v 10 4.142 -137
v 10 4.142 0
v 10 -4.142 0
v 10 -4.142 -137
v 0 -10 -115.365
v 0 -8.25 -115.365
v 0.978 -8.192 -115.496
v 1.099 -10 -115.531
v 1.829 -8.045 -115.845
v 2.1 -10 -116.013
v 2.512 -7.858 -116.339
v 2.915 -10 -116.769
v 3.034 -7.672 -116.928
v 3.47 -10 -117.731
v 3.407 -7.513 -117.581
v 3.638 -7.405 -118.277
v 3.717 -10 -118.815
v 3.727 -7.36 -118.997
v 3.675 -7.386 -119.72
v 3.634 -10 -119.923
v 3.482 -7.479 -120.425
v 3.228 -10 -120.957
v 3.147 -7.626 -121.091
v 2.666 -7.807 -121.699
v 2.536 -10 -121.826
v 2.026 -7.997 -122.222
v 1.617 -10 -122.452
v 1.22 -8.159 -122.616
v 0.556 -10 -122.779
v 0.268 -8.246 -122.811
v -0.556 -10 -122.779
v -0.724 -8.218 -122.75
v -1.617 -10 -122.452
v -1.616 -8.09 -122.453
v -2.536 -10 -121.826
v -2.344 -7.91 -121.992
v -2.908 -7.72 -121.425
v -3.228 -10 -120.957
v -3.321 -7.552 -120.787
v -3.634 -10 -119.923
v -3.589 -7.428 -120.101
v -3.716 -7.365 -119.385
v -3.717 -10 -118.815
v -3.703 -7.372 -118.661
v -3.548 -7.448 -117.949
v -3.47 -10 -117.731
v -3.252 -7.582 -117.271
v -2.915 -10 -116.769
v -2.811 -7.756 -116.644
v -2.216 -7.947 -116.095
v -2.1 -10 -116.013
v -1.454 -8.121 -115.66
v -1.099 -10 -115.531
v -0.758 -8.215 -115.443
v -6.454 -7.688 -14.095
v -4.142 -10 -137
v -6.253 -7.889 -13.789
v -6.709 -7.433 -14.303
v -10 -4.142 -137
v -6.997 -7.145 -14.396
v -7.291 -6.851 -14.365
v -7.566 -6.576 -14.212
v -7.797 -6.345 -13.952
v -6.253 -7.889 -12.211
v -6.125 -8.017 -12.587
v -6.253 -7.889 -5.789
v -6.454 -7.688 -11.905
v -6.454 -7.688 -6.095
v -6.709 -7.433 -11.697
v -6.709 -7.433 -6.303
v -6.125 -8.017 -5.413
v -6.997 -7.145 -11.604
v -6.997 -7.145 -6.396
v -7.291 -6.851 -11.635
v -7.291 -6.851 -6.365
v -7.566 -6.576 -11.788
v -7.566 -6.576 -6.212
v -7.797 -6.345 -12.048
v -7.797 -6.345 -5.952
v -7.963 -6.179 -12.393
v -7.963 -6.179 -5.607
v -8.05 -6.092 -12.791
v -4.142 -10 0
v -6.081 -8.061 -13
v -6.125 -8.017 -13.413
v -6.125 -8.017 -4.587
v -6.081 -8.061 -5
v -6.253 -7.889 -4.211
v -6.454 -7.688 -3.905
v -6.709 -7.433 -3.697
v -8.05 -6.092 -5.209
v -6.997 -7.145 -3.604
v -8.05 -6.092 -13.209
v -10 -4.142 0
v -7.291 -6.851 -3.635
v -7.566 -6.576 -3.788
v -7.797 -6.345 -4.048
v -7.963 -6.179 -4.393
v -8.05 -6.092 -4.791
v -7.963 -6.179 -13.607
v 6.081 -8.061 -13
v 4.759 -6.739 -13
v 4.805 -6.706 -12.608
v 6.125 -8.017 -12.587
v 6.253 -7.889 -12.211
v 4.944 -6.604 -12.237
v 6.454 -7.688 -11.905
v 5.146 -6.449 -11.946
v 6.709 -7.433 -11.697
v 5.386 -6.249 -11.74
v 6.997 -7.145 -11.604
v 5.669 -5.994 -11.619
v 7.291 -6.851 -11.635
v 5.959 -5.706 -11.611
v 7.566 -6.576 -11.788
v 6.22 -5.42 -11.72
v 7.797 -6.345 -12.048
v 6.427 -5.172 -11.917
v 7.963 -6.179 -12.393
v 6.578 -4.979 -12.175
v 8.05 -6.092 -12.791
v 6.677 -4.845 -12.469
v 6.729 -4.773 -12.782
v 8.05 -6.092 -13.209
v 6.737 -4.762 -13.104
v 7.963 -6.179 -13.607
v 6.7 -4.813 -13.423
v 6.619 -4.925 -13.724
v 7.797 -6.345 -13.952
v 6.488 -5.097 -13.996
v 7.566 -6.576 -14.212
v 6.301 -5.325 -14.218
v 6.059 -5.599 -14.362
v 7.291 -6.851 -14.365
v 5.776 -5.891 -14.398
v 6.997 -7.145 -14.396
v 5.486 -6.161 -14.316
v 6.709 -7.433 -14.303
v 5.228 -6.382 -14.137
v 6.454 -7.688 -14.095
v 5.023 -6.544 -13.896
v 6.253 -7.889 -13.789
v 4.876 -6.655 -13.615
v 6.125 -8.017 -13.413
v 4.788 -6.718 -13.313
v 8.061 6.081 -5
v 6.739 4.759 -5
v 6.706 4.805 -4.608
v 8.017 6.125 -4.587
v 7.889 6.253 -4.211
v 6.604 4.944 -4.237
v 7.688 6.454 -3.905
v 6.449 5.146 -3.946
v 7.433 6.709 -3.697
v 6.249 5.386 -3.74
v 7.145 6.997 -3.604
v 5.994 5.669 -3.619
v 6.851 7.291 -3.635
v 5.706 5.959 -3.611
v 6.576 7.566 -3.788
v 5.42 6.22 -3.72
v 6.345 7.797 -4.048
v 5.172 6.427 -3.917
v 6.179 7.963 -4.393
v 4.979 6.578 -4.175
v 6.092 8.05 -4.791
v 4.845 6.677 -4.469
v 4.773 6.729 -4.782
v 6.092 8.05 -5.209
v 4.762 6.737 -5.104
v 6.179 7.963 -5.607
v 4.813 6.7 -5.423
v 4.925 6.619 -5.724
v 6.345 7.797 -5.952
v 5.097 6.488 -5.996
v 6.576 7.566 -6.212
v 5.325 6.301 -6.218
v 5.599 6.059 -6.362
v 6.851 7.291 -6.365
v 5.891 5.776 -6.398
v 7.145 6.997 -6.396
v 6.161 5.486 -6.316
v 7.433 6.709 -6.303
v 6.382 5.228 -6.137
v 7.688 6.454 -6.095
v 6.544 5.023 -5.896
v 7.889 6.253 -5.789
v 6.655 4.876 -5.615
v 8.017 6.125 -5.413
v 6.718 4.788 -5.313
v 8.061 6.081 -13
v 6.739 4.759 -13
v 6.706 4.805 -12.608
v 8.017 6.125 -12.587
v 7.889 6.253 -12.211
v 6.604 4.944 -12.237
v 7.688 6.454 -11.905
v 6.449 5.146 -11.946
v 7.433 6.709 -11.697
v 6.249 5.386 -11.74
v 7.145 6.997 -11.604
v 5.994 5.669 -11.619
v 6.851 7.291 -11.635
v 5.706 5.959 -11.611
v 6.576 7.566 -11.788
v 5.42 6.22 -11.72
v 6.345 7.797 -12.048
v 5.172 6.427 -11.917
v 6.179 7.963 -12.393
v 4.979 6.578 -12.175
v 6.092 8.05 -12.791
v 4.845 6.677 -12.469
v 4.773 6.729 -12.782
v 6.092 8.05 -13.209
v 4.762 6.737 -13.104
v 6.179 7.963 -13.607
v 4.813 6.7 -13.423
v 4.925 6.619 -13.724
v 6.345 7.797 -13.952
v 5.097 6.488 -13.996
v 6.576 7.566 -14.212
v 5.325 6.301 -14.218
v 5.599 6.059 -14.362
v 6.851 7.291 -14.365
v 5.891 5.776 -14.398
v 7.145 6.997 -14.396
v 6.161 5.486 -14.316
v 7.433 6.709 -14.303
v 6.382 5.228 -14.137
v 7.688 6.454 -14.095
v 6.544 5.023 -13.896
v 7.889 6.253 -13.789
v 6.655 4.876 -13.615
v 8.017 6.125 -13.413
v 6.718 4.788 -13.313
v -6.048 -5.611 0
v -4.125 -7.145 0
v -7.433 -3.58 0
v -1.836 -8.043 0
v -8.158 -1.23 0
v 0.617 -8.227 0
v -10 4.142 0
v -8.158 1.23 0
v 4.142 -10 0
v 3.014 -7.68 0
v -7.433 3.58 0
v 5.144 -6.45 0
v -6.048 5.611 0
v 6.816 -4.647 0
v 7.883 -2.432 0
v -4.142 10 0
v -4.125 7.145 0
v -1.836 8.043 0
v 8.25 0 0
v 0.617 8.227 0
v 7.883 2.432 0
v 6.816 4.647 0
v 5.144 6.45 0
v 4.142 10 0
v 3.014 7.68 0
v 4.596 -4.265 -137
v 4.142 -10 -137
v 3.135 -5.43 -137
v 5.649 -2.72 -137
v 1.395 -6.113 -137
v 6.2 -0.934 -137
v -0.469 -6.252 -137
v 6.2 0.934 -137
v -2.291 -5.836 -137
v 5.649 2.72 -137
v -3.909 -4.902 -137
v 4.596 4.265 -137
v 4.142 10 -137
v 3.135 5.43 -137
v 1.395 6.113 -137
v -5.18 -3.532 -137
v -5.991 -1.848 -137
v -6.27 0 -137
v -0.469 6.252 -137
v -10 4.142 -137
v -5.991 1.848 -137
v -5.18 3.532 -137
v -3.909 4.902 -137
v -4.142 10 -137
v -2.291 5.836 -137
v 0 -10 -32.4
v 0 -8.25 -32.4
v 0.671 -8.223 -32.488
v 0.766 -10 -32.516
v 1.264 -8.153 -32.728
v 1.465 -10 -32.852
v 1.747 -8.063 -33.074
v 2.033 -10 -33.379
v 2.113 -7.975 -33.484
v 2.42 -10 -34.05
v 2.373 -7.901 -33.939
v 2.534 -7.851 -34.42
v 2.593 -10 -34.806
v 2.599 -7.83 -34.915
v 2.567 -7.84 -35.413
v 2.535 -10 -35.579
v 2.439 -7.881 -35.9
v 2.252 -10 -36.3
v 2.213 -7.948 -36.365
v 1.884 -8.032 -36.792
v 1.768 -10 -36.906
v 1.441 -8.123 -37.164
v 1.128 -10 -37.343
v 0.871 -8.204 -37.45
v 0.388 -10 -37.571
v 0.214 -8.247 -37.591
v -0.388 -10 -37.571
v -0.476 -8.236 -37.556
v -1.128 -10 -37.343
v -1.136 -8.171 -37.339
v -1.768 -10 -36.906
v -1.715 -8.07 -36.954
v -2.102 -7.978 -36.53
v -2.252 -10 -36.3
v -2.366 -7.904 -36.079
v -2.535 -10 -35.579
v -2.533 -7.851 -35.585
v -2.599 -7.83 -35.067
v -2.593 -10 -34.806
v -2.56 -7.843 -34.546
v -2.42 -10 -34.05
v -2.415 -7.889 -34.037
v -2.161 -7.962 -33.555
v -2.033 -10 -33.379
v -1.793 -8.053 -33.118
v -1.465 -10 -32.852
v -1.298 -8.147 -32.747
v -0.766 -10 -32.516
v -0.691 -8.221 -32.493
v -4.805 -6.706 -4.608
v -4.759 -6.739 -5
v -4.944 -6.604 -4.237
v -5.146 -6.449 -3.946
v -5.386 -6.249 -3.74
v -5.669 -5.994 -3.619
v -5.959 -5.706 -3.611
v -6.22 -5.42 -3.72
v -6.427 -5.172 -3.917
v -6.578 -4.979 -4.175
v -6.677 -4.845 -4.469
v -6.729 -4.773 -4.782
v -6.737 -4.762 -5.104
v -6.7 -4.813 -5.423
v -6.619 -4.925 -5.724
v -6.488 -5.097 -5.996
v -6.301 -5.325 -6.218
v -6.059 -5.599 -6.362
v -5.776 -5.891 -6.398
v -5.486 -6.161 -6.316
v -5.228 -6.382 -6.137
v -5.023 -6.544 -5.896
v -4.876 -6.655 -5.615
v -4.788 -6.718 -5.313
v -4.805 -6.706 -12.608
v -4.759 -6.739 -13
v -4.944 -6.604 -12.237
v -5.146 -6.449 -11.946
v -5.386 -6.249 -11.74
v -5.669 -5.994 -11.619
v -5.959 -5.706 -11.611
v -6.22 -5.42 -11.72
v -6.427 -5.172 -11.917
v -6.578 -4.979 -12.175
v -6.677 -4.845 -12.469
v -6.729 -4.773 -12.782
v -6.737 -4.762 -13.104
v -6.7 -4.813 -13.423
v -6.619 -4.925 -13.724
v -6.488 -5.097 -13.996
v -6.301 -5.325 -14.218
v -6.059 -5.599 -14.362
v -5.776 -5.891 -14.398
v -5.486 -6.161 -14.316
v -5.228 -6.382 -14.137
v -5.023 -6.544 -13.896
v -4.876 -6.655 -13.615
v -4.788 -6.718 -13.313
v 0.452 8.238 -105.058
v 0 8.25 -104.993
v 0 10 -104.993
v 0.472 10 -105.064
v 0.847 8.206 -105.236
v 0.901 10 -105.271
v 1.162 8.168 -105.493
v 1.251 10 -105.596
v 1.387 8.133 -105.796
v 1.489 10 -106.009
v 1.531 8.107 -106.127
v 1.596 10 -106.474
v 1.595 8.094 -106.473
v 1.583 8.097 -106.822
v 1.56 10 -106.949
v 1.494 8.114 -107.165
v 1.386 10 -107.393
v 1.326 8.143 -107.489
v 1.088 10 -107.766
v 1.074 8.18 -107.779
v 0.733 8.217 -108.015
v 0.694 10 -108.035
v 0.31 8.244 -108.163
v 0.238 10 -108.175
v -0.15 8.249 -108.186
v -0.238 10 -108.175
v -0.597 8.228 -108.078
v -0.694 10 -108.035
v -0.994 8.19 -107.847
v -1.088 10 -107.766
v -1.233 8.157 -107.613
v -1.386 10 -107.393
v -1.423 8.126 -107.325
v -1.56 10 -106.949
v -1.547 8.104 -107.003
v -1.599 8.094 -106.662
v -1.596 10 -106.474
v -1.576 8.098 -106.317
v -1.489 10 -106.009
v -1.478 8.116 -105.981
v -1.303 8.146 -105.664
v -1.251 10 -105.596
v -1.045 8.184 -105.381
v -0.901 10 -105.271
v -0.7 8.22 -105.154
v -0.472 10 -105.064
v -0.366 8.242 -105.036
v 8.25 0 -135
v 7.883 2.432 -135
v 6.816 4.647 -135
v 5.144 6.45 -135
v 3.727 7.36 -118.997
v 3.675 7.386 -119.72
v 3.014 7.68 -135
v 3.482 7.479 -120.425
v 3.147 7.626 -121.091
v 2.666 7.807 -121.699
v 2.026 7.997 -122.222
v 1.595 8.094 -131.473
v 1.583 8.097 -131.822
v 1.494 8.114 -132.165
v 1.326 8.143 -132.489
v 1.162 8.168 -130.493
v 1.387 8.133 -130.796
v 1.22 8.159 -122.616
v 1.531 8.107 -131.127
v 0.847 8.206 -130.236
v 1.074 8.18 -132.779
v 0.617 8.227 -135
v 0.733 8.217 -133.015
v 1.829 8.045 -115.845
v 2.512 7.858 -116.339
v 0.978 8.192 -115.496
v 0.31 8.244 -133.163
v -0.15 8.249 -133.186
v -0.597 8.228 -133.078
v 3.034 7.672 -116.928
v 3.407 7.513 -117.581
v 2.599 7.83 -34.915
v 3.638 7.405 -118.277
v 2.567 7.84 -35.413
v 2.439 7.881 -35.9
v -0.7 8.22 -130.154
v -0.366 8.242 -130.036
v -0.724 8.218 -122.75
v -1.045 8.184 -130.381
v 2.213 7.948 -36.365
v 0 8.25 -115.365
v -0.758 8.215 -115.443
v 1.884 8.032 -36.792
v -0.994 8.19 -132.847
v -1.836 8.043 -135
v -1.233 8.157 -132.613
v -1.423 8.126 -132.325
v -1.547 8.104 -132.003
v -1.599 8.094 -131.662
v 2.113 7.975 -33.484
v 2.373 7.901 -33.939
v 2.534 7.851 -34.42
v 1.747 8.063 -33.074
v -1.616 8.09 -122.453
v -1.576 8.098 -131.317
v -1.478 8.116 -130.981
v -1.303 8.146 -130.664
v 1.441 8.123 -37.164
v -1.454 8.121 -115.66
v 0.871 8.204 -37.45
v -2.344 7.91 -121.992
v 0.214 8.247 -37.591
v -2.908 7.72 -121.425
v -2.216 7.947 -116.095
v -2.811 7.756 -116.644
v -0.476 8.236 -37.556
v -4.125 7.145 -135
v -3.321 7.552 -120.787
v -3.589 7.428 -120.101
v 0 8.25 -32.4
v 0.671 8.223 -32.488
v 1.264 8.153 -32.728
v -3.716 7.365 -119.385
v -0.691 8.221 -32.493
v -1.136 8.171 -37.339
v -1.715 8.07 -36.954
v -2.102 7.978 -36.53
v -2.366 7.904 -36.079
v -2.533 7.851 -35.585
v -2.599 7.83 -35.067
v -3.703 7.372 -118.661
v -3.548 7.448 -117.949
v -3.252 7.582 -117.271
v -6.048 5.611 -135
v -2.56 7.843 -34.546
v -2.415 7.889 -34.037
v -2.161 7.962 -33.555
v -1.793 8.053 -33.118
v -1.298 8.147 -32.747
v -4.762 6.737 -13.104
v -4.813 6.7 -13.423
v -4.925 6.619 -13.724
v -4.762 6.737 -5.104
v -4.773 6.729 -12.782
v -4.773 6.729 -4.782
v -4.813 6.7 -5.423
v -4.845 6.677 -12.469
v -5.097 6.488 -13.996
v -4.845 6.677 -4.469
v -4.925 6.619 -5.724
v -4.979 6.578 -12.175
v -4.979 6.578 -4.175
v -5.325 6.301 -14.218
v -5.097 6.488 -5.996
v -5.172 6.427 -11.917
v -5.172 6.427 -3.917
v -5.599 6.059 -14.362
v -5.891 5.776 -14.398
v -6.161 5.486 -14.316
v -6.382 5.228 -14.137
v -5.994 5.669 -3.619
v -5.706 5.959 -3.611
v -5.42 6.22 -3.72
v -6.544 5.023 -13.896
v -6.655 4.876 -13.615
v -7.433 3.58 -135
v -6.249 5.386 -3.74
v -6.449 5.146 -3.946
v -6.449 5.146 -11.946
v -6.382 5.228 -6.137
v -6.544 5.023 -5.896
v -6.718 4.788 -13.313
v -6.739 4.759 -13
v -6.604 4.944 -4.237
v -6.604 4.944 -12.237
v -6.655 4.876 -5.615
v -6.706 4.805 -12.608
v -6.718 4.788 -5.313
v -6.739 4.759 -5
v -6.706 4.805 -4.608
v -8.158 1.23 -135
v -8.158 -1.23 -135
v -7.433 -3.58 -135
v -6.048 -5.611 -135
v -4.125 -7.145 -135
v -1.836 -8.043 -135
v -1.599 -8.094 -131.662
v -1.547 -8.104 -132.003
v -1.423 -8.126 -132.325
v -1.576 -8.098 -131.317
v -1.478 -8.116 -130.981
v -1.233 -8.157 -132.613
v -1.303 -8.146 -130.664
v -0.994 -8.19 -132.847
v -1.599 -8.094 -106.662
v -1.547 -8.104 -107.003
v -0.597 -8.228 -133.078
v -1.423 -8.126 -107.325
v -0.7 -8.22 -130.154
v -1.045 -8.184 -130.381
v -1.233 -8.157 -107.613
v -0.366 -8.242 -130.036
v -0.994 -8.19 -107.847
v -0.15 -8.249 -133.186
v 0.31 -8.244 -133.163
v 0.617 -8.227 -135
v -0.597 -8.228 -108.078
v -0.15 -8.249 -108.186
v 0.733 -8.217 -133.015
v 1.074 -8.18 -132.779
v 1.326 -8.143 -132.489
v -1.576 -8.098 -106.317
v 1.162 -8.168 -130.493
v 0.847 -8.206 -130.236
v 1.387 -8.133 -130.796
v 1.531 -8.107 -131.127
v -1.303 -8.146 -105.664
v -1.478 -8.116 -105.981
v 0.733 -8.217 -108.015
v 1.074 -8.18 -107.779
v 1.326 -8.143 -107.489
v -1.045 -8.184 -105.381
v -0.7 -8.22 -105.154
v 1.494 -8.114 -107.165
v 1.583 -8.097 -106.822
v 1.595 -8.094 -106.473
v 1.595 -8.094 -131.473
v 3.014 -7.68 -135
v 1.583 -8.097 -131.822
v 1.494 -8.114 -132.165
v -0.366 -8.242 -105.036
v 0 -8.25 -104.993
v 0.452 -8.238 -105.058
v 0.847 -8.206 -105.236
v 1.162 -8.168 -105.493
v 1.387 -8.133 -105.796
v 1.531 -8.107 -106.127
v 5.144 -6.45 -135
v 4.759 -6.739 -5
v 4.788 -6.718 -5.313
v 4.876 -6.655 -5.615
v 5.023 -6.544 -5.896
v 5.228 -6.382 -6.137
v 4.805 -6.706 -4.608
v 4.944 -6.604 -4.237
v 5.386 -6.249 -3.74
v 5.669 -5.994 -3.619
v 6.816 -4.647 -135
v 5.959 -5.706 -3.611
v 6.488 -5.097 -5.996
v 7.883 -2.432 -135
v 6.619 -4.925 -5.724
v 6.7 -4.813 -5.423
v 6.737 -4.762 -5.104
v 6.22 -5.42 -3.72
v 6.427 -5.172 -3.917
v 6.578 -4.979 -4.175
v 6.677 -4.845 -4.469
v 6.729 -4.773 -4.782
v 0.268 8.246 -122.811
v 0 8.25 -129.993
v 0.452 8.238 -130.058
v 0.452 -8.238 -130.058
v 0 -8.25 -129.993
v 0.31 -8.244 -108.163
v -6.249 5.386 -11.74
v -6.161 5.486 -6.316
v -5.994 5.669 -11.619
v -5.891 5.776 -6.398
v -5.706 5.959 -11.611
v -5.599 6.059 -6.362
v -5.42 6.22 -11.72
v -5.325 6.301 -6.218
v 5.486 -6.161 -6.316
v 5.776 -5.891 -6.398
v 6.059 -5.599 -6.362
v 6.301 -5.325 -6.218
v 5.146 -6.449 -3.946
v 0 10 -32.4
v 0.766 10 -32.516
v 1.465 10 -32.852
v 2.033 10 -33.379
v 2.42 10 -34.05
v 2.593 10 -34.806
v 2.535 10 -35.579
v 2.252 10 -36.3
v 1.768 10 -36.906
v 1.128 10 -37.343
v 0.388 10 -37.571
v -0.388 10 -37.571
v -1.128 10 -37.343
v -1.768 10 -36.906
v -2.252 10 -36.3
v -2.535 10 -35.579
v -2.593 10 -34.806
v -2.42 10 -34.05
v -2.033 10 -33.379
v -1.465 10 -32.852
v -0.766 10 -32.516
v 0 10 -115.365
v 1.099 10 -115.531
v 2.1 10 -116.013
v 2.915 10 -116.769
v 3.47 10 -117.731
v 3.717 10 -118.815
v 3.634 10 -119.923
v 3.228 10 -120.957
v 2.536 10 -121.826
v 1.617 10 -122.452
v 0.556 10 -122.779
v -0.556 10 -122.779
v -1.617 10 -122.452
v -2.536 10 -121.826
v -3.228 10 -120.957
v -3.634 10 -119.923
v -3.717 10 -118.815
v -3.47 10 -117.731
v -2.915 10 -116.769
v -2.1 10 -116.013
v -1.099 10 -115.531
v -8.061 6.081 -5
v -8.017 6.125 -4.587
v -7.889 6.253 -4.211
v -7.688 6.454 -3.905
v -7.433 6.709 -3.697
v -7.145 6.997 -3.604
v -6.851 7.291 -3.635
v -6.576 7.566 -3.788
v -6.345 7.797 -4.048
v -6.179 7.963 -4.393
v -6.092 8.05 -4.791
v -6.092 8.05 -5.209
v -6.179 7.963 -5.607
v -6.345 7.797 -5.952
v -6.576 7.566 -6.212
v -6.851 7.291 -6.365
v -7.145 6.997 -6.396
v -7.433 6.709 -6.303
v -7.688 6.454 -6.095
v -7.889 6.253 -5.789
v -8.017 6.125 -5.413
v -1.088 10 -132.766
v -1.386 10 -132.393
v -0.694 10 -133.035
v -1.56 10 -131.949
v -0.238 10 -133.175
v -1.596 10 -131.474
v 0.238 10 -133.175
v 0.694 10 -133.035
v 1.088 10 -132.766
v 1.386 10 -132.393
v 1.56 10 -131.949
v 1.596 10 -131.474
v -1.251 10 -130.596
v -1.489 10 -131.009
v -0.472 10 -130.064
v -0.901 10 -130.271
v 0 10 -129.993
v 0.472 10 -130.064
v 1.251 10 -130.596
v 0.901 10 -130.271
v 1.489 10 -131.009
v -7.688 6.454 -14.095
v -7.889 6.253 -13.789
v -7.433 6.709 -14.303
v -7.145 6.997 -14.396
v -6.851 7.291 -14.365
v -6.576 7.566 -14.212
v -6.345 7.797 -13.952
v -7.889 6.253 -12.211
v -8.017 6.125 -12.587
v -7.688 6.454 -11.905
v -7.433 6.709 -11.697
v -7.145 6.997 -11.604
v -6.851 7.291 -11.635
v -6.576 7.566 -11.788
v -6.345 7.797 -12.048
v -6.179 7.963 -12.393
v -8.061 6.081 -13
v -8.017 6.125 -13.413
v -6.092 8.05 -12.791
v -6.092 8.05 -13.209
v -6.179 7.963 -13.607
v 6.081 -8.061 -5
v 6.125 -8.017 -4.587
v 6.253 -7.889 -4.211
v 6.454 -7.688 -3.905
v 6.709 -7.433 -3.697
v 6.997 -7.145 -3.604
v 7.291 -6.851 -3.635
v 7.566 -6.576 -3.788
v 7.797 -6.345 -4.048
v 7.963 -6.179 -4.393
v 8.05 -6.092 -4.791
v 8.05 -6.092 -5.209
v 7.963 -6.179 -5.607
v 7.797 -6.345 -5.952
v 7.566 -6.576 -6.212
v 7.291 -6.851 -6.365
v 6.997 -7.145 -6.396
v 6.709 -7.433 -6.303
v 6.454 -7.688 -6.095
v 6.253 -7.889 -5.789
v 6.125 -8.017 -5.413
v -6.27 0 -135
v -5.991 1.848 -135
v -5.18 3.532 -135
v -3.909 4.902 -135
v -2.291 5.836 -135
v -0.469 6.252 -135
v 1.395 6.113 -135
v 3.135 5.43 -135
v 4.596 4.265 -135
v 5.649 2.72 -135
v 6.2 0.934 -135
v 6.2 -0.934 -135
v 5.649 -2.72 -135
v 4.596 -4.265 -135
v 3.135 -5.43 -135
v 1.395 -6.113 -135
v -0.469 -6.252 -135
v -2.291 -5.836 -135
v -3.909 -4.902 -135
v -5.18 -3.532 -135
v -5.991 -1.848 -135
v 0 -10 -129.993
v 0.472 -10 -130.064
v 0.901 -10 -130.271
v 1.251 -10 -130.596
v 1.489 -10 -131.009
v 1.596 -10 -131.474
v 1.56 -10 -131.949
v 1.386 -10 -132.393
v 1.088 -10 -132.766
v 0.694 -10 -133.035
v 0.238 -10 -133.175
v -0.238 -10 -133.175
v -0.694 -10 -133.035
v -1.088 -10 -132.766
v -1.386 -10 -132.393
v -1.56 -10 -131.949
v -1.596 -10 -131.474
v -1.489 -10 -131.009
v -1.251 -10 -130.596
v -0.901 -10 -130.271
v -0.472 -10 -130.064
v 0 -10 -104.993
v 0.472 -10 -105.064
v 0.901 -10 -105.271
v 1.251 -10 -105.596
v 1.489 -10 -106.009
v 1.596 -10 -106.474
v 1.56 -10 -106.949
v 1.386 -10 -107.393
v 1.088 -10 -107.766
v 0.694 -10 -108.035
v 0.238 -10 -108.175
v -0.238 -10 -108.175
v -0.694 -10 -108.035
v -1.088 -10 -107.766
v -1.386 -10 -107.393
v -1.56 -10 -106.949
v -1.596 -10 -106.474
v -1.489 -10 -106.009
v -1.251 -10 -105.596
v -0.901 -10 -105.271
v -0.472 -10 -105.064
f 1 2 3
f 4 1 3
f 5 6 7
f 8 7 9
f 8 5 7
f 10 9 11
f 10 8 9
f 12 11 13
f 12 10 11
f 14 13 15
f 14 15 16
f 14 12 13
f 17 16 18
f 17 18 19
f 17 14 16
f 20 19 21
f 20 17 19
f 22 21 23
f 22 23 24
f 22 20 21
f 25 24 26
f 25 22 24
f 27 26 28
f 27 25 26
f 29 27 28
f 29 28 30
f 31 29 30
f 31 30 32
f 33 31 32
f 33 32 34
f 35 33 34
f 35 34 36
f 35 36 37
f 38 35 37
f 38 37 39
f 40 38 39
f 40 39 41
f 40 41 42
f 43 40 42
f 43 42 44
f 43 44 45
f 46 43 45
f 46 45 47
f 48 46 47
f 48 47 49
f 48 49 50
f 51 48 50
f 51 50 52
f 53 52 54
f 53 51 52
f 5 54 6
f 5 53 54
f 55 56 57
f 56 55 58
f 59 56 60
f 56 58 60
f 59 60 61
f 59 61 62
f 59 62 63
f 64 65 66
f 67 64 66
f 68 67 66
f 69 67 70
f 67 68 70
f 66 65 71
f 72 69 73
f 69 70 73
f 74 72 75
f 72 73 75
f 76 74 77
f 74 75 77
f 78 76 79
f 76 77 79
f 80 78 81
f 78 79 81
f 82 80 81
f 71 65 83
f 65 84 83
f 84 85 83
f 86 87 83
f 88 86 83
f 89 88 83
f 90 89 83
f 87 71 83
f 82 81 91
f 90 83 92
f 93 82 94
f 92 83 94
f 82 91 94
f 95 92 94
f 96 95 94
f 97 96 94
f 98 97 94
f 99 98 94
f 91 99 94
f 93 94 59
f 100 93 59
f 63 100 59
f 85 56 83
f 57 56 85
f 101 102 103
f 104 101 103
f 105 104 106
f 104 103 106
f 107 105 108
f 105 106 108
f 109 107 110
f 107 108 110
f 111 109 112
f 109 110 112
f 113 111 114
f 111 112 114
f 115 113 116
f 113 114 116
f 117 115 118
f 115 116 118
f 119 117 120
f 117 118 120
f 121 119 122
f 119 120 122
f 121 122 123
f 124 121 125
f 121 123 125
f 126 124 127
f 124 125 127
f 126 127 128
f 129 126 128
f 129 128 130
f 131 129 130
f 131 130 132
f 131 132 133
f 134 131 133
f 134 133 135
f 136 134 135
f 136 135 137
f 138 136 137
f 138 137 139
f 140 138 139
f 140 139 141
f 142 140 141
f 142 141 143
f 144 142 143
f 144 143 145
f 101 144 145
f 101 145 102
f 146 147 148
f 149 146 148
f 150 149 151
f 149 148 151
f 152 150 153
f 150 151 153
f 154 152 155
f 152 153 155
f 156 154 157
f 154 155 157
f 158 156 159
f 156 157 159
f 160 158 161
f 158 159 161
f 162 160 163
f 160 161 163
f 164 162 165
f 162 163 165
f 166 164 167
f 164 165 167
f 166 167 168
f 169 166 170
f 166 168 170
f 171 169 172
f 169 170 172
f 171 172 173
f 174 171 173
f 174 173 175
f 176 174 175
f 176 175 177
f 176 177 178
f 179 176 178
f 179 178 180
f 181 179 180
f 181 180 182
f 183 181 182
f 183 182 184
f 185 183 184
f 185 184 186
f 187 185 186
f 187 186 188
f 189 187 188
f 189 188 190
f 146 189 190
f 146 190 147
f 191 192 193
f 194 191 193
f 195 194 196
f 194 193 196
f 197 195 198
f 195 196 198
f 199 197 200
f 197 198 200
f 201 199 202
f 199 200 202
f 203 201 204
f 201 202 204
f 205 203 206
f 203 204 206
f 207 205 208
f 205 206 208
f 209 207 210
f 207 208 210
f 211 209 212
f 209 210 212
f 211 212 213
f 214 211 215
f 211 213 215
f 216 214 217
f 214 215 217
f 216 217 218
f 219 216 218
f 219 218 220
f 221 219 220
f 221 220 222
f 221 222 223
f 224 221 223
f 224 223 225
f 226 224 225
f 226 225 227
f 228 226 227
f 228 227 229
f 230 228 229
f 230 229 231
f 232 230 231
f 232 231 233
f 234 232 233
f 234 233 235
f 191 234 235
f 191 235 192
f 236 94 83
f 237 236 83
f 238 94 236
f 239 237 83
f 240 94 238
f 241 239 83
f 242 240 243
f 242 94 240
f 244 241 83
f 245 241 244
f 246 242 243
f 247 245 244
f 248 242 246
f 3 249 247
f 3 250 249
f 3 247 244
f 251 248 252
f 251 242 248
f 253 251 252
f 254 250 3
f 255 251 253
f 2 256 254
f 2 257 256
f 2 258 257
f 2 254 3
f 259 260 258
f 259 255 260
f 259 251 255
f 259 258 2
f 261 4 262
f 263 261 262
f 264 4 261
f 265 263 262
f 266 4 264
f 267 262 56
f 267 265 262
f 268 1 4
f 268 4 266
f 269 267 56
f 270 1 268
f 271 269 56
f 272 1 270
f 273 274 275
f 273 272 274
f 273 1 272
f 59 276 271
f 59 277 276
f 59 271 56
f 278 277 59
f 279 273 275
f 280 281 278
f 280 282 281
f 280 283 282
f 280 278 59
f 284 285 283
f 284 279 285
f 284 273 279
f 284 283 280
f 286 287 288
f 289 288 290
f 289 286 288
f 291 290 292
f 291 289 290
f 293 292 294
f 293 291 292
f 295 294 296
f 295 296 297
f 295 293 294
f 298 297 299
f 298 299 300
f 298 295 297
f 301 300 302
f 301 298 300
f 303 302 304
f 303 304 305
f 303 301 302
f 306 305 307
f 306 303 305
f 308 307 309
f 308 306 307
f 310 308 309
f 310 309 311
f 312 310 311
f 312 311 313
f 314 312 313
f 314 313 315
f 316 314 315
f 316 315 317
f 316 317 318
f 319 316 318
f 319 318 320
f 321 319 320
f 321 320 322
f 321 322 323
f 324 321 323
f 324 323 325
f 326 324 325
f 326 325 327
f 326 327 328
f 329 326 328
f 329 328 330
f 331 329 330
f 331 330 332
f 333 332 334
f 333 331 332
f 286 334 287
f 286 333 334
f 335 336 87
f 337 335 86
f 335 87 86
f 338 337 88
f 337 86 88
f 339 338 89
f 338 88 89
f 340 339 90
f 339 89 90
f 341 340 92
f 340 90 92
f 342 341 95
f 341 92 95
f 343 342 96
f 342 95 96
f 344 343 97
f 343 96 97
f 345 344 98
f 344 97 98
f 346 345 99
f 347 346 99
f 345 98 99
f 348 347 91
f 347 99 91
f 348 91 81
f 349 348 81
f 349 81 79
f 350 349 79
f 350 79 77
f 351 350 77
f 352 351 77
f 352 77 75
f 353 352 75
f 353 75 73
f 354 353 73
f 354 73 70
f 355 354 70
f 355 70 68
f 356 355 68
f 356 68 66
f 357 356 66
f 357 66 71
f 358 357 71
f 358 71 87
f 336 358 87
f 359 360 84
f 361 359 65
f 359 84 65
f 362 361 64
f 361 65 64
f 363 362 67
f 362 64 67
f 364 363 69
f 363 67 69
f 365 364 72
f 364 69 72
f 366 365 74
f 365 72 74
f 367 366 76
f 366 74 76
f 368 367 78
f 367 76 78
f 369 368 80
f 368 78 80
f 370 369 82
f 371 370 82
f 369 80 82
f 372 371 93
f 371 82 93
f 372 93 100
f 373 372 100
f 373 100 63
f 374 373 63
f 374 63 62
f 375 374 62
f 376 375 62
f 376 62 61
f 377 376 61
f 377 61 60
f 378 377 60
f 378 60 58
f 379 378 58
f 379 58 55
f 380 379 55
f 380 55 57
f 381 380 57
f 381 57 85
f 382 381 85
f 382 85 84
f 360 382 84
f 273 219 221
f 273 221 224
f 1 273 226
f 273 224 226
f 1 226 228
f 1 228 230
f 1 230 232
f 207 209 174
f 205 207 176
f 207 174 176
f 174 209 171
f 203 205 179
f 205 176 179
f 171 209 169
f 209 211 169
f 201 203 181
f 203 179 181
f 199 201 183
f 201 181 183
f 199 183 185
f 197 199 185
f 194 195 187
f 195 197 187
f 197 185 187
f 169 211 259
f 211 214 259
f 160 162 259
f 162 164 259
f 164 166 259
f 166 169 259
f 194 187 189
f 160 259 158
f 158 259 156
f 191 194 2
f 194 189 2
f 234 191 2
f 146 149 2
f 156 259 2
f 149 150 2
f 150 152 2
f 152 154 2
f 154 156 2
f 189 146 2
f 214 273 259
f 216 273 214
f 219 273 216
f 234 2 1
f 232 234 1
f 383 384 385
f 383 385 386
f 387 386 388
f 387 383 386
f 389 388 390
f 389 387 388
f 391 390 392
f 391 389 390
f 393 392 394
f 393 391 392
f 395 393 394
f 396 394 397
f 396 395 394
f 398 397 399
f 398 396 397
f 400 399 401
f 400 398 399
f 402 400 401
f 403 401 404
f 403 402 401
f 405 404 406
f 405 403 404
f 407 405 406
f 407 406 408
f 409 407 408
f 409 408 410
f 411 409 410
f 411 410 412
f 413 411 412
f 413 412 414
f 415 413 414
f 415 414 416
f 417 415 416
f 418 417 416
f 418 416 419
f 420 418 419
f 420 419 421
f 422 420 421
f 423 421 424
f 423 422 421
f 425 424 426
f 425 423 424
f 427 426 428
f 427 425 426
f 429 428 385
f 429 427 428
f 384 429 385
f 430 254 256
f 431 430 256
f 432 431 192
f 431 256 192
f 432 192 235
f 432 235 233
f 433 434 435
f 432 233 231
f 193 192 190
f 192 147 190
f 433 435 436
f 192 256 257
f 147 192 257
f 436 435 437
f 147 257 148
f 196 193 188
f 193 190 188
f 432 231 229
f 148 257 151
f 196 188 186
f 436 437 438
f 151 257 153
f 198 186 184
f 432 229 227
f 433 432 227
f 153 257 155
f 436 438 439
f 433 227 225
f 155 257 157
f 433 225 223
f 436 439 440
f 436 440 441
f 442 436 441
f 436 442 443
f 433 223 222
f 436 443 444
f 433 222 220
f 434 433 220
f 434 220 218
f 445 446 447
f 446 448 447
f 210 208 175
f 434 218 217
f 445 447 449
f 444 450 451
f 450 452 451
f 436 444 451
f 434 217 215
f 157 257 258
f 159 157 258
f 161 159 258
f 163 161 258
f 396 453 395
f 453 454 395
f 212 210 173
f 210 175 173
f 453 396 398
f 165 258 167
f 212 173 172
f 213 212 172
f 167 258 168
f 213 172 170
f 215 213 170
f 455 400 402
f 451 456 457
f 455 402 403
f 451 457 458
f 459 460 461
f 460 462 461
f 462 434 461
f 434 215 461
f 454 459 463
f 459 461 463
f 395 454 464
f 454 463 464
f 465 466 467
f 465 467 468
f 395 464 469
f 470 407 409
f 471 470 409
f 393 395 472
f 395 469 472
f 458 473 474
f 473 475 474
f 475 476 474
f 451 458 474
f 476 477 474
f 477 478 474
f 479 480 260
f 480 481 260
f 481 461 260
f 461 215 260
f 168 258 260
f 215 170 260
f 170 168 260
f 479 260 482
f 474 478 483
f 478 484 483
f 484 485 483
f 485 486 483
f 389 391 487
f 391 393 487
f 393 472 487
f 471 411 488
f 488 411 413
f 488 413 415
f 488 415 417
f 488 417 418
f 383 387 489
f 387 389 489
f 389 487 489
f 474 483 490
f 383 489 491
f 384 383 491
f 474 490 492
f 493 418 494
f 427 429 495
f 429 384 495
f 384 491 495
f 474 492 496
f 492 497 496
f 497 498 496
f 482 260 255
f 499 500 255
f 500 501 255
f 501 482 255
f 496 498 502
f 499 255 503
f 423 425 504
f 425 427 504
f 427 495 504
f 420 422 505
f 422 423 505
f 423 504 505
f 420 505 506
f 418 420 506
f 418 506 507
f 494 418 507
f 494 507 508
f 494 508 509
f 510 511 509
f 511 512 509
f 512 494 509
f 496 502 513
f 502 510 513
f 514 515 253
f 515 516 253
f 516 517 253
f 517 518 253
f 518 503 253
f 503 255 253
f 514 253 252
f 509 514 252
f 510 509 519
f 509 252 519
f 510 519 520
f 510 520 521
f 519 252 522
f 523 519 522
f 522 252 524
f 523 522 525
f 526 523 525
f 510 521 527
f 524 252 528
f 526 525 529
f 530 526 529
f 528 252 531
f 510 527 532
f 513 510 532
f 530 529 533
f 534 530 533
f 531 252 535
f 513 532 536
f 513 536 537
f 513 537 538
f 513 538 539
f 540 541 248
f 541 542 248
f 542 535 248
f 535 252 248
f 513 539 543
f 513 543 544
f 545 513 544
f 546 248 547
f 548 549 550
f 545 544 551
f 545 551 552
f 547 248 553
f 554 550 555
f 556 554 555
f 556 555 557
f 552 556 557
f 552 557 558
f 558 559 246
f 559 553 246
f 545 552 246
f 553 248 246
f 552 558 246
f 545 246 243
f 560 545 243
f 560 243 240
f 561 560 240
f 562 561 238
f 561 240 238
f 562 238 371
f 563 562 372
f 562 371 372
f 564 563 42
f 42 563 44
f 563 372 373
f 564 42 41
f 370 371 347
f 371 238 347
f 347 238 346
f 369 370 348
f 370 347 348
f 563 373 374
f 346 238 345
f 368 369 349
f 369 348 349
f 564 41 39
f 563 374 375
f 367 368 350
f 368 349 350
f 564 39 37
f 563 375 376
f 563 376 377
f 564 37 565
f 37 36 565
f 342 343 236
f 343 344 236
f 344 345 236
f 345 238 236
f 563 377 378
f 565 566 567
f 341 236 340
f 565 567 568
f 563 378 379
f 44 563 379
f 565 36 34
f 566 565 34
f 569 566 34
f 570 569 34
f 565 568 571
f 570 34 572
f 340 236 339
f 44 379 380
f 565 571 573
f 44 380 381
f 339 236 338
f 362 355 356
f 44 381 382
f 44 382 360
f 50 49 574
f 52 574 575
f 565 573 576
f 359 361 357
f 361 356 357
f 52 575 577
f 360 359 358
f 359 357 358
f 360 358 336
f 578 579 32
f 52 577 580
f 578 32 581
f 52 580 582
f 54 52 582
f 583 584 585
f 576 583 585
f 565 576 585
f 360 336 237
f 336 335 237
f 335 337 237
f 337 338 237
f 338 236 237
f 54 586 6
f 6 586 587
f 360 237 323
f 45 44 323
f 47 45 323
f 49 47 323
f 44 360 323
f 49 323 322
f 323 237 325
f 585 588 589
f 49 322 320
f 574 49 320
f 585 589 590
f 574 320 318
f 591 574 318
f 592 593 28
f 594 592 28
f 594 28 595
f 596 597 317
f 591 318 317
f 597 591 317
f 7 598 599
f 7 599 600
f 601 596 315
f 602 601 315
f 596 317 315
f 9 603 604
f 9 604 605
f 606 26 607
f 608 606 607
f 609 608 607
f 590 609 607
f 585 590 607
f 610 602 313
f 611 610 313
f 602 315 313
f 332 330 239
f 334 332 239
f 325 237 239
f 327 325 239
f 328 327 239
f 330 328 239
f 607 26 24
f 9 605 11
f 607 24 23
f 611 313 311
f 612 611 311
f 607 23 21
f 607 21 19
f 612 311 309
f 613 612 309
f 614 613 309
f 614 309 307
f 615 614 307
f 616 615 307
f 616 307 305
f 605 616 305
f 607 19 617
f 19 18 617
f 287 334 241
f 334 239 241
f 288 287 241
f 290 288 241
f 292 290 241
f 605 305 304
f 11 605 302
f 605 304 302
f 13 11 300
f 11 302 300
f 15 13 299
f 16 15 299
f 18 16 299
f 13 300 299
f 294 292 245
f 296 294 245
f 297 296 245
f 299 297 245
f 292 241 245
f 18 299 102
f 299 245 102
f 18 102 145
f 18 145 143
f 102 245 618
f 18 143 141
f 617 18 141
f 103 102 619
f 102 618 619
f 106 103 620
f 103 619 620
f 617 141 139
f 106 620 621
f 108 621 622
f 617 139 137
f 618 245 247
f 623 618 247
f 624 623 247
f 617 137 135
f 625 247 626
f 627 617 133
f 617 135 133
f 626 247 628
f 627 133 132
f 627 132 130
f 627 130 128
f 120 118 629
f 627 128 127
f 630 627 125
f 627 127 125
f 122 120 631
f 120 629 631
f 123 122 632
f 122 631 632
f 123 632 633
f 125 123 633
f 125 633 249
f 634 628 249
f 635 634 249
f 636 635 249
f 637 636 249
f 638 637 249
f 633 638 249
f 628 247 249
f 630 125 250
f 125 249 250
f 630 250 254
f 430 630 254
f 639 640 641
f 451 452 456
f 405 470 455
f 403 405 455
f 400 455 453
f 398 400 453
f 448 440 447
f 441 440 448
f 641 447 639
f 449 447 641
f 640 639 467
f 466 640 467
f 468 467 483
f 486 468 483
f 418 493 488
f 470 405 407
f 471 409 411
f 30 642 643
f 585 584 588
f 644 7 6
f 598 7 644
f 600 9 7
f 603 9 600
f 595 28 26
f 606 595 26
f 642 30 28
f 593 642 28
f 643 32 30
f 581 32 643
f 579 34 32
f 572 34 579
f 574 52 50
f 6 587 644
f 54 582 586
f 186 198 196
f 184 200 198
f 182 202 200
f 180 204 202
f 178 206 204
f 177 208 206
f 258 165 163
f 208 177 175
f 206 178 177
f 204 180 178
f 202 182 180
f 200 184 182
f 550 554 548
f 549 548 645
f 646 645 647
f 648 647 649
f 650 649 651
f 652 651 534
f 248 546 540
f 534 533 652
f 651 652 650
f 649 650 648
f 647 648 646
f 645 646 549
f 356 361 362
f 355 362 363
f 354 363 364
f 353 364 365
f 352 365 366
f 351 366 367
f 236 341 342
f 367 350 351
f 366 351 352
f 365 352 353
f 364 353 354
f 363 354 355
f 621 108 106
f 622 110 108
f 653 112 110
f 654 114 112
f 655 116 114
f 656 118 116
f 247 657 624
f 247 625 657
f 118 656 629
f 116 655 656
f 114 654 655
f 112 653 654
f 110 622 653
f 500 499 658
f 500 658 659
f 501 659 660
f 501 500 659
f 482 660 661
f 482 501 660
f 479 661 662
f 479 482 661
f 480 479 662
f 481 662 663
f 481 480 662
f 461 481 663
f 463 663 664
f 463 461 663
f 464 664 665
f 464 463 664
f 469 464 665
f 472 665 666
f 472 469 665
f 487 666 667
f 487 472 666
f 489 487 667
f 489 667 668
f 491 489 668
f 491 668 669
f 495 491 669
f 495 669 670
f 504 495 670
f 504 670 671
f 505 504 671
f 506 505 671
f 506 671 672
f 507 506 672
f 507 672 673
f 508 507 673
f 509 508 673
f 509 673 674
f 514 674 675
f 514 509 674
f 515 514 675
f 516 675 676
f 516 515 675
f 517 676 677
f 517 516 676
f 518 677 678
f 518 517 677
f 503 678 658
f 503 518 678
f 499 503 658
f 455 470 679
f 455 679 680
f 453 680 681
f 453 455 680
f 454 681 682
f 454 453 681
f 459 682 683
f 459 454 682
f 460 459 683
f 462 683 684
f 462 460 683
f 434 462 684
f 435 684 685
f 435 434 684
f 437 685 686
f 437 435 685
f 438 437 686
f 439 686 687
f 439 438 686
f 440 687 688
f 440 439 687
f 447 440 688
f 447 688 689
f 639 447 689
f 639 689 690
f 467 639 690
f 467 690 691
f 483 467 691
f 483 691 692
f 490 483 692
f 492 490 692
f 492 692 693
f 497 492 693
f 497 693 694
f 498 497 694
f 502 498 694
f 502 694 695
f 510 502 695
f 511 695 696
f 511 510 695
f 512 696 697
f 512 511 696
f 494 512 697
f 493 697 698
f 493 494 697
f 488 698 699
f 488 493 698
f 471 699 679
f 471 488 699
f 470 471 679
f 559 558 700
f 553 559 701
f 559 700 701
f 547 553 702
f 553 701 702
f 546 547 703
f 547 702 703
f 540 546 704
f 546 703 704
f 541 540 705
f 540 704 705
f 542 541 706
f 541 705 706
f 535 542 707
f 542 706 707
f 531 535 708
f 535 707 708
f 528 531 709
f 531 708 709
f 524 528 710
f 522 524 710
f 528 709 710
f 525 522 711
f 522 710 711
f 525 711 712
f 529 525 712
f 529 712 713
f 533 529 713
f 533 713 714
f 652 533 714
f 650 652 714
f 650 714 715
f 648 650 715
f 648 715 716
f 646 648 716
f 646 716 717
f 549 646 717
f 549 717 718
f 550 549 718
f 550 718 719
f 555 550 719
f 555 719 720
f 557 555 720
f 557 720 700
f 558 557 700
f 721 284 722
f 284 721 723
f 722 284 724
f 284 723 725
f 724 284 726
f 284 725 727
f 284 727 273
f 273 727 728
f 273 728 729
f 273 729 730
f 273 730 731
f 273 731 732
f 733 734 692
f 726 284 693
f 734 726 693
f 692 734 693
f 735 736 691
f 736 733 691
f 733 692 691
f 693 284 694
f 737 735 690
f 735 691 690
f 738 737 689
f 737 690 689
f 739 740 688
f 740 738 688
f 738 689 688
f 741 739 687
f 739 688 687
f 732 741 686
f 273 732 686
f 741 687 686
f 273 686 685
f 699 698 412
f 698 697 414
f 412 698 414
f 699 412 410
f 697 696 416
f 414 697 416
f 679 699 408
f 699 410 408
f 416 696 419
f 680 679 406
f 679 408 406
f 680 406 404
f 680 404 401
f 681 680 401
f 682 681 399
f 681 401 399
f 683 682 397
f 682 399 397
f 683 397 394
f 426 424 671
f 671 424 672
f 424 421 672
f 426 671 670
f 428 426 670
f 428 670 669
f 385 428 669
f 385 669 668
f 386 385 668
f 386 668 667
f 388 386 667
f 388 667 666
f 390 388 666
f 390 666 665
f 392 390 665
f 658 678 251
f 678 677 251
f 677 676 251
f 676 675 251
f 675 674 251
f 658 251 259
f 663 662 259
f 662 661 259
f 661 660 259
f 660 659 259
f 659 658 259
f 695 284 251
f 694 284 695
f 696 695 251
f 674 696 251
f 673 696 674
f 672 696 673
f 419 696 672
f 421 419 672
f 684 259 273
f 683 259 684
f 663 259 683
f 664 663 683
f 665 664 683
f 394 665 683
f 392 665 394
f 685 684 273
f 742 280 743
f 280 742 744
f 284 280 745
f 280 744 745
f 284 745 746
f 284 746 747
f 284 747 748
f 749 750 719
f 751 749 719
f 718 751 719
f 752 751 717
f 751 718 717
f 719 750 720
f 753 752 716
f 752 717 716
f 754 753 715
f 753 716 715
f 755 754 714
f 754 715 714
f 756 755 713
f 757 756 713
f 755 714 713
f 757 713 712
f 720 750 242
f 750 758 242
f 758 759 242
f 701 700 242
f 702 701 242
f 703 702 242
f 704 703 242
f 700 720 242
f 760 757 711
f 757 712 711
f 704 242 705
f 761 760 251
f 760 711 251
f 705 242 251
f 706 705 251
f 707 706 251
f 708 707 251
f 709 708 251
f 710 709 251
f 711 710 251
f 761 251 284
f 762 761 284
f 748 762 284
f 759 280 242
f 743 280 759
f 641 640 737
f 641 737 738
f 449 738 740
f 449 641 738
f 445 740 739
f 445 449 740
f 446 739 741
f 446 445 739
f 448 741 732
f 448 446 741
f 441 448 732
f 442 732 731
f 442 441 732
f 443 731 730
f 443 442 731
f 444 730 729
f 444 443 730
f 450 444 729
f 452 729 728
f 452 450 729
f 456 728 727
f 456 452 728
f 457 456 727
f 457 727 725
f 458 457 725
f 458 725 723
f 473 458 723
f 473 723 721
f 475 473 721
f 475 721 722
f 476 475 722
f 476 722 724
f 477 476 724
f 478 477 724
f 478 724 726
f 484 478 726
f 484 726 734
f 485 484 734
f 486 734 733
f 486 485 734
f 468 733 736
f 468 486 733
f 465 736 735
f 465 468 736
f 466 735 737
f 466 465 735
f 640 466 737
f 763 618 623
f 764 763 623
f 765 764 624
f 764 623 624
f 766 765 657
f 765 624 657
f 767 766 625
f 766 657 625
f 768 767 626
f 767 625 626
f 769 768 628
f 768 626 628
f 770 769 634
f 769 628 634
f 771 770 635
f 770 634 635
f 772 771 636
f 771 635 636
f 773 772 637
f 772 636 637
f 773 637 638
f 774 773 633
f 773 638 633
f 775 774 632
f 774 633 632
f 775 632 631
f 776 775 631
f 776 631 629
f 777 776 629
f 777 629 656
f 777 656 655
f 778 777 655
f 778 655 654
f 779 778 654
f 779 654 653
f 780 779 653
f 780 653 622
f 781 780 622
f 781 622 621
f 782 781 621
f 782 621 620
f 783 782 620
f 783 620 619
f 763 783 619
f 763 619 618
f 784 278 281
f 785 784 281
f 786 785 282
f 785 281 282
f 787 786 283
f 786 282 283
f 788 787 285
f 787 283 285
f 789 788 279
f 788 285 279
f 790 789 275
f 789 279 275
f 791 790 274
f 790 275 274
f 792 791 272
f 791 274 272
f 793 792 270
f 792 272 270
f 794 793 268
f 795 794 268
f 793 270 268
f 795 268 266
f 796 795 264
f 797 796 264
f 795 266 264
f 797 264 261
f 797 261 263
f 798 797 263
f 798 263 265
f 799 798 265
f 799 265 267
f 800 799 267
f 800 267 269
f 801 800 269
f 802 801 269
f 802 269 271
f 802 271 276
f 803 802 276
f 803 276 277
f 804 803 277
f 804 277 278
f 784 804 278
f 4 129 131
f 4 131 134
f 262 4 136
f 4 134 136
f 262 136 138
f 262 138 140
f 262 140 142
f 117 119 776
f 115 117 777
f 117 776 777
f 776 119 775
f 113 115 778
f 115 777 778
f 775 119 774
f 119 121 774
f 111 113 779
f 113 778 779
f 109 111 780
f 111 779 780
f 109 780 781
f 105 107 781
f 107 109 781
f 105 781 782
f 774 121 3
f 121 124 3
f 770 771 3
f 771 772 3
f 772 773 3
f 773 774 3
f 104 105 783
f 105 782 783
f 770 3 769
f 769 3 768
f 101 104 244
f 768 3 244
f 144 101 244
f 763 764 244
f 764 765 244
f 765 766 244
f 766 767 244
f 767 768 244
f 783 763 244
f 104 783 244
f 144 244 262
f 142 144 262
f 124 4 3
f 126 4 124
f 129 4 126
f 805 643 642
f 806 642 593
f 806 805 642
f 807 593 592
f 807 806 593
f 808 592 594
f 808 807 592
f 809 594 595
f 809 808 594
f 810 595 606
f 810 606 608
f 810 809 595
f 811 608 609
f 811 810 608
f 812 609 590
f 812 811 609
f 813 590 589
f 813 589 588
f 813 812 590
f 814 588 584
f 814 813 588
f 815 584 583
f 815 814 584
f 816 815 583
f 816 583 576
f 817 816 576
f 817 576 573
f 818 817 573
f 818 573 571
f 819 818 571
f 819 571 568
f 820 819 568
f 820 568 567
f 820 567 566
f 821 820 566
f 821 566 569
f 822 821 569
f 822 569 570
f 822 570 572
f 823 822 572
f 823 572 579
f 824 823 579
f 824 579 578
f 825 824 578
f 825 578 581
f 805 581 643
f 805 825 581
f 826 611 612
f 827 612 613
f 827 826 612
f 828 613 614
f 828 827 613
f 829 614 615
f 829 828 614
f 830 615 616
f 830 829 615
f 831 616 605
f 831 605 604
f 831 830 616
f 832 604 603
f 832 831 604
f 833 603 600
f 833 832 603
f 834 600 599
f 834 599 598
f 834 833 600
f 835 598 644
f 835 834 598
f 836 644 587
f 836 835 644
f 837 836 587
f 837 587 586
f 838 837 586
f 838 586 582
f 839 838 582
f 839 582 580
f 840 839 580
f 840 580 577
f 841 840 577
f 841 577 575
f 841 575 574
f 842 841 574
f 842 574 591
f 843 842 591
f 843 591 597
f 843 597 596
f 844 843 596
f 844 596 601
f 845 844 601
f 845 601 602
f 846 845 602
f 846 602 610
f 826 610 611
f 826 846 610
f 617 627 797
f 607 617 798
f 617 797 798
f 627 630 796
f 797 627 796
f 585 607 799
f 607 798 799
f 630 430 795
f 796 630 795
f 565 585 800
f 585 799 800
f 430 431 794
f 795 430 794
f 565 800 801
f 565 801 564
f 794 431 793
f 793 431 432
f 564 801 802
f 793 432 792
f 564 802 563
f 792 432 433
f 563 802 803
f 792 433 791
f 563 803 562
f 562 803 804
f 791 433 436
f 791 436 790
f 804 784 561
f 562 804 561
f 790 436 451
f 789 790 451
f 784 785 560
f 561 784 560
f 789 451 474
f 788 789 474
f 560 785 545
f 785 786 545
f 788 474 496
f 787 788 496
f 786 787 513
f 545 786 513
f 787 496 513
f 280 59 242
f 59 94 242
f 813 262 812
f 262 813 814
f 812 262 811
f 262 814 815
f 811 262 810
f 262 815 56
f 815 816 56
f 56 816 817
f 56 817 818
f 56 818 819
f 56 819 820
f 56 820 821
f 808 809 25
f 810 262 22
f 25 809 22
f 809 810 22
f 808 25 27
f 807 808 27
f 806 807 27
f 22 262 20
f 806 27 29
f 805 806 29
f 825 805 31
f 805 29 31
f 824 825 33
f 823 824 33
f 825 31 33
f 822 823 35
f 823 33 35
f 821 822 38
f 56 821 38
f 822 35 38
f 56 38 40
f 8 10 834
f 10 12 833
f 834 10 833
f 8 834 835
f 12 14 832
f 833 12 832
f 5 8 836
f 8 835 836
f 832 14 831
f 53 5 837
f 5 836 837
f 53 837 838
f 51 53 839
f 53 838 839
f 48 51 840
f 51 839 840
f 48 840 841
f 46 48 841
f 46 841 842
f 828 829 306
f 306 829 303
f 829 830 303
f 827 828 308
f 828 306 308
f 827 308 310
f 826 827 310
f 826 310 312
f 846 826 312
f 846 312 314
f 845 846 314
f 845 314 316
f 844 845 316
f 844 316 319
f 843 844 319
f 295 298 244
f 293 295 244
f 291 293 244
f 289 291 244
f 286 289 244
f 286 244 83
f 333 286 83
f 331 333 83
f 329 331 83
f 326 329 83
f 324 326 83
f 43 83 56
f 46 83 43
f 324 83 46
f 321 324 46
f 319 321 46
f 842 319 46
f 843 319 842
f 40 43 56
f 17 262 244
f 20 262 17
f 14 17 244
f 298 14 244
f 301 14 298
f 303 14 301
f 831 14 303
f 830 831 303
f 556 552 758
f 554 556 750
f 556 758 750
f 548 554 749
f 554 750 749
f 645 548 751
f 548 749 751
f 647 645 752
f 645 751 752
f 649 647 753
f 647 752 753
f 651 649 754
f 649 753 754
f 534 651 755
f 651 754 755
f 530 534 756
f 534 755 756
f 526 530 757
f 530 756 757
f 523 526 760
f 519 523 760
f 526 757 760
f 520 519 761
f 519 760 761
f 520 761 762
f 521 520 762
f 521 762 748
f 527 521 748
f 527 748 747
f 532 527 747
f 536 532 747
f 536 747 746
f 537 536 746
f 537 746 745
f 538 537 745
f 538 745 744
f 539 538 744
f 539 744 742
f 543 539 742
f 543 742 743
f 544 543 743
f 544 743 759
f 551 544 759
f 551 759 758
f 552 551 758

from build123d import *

# Parameters (mm, degrees)
SKETCH1_R               = 8.25
BOSS_EXTRUDE1_DEPTH     = 135
BOSS_EXTRUDE2_DEPTH     = 2
CUT_EXTRUDE1_DEPTH      = 138.727992797
CUT_EXTRUDE1_DEPTH_BACK = 138.727992797
SKETCH4_R               = 1.6
SKETCH4_R_2             = 2.6
SKETCH4_R_3             = 3.727922061
SKETCH6_R               = 1.4
CUT_EXTRUDE2_DEPTH      = 140.11090078
CIRPATTERN1_COUNT       = 2
CIRPATTERN1_ANGLE       = 270
SKETCH7_R               = 6.269832862
CUT_EXTRUDE3_DEPTH      = 138.727992904


with BuildPart() as part:
    # Sketch1 → Boss-Extrude1 (new body)
    with BuildSketch(Plane.XY):
        Polygon((10, 4.142135624), (4.142135624, 10), (-4.142135624, 10), (-10, 4.142135624), (-10, -4.142135624), (-4.142135624, -10), (4.142135624, -10), (10, -4.142135624), align=None)
        Circle(SKETCH1_R, mode=Mode.SUBTRACT)
    extrude(amount=-BOSS_EXTRUDE1_DEPTH)

    # Sketch2 → Boss-Extrude2 (add)
    with BuildSketch(Plane(origin=(0, 0, -135), x_dir=(-1, 0, 0), z_dir=(0, 0, -1))):
        Polygon((-10, 4.142135624), (-10, -4.142135624), (-4.142135624, -10), (4.142135624, -10), (10, -4.142135624), (10, 4.142135624), (4.142135624, 10), (-4.142135624, 10), align=None)
    extrude(amount=BOSS_EXTRUDE2_DEPTH)

    # Sketch4 → Cut-Extrude1 (cut, two sides: drawn at the far end of the back side and taken through both)
    with BuildSketch(Plane(origin=(0, 0, 0), x_dir=(1, 0, 0), z_dir=(0, 1, 0)).offset(-CUT_EXTRUDE1_DEPTH_BACK)):
        with Locations(Location((0, 131.593089119, 0), (0, 0, 270))):
            Circle(SKETCH4_R)
        with Locations(Location((0, 106.593089119, 0), (0, 0, 270))):
            Circle(SKETCH4_R)
        with Locations(Location((0, 35, 0), (0, 0, 270))):
            Circle(SKETCH4_R_2)
        with Locations(Location((0, 119.093089119, 0), (0, 0, 270))):
            Circle(SKETCH4_R_3)
    extrude(amount=CUT_EXTRUDE1_DEPTH + CUT_EXTRUDE1_DEPTH_BACK, mode=Mode.SUBTRACT)

    # Sketch6 → Cut-Extrude2 (cut, through all)
    with BuildSketch(Plane(origin=(-7.071067812, 7.071067812, 0), x_dir=(0, 0, 1), z_dir=(-0.7071067811865476, 0.7071067811865476, 0))):
        with Locations(Location((-13, 0, 0), (0, 0, 270))):
            Circle(SKETCH6_R)
        with Locations(Location((-5, 0, 0), (0, 0, 270))):
            Circle(SKETCH6_R)
    cut_extrude2 = extrude(amount=-CUT_EXTRUDE2_DEPTH, mode=Mode.SUBTRACT)

    # CirPattern1: Cut-Extrude2 ×2 about axis
    cirpattern1_axis = Axis((0, 0, 6.85), (0, 0, -1))
    for i in range(1, CIRPATTERN1_COUNT):
        add(cut_extrude2.rotate(cirpattern1_axis, i * CIRPATTERN1_ANGLE / (CIRPATTERN1_COUNT - 1)), mode=Mode.SUBTRACT)

    # Sketch7 → Cut-Extrude3 (cut, through all)
    with BuildSketch(Plane(origin=(0, 0, -137), x_dir=(-1, 0, 0), z_dir=(0, 0, -1))):
        Circle(SKETCH7_R)
    extrude(amount=-CUT_EXTRUDE3_DEPTH, mode=Mode.SUBTRACT)


solid = part.part
